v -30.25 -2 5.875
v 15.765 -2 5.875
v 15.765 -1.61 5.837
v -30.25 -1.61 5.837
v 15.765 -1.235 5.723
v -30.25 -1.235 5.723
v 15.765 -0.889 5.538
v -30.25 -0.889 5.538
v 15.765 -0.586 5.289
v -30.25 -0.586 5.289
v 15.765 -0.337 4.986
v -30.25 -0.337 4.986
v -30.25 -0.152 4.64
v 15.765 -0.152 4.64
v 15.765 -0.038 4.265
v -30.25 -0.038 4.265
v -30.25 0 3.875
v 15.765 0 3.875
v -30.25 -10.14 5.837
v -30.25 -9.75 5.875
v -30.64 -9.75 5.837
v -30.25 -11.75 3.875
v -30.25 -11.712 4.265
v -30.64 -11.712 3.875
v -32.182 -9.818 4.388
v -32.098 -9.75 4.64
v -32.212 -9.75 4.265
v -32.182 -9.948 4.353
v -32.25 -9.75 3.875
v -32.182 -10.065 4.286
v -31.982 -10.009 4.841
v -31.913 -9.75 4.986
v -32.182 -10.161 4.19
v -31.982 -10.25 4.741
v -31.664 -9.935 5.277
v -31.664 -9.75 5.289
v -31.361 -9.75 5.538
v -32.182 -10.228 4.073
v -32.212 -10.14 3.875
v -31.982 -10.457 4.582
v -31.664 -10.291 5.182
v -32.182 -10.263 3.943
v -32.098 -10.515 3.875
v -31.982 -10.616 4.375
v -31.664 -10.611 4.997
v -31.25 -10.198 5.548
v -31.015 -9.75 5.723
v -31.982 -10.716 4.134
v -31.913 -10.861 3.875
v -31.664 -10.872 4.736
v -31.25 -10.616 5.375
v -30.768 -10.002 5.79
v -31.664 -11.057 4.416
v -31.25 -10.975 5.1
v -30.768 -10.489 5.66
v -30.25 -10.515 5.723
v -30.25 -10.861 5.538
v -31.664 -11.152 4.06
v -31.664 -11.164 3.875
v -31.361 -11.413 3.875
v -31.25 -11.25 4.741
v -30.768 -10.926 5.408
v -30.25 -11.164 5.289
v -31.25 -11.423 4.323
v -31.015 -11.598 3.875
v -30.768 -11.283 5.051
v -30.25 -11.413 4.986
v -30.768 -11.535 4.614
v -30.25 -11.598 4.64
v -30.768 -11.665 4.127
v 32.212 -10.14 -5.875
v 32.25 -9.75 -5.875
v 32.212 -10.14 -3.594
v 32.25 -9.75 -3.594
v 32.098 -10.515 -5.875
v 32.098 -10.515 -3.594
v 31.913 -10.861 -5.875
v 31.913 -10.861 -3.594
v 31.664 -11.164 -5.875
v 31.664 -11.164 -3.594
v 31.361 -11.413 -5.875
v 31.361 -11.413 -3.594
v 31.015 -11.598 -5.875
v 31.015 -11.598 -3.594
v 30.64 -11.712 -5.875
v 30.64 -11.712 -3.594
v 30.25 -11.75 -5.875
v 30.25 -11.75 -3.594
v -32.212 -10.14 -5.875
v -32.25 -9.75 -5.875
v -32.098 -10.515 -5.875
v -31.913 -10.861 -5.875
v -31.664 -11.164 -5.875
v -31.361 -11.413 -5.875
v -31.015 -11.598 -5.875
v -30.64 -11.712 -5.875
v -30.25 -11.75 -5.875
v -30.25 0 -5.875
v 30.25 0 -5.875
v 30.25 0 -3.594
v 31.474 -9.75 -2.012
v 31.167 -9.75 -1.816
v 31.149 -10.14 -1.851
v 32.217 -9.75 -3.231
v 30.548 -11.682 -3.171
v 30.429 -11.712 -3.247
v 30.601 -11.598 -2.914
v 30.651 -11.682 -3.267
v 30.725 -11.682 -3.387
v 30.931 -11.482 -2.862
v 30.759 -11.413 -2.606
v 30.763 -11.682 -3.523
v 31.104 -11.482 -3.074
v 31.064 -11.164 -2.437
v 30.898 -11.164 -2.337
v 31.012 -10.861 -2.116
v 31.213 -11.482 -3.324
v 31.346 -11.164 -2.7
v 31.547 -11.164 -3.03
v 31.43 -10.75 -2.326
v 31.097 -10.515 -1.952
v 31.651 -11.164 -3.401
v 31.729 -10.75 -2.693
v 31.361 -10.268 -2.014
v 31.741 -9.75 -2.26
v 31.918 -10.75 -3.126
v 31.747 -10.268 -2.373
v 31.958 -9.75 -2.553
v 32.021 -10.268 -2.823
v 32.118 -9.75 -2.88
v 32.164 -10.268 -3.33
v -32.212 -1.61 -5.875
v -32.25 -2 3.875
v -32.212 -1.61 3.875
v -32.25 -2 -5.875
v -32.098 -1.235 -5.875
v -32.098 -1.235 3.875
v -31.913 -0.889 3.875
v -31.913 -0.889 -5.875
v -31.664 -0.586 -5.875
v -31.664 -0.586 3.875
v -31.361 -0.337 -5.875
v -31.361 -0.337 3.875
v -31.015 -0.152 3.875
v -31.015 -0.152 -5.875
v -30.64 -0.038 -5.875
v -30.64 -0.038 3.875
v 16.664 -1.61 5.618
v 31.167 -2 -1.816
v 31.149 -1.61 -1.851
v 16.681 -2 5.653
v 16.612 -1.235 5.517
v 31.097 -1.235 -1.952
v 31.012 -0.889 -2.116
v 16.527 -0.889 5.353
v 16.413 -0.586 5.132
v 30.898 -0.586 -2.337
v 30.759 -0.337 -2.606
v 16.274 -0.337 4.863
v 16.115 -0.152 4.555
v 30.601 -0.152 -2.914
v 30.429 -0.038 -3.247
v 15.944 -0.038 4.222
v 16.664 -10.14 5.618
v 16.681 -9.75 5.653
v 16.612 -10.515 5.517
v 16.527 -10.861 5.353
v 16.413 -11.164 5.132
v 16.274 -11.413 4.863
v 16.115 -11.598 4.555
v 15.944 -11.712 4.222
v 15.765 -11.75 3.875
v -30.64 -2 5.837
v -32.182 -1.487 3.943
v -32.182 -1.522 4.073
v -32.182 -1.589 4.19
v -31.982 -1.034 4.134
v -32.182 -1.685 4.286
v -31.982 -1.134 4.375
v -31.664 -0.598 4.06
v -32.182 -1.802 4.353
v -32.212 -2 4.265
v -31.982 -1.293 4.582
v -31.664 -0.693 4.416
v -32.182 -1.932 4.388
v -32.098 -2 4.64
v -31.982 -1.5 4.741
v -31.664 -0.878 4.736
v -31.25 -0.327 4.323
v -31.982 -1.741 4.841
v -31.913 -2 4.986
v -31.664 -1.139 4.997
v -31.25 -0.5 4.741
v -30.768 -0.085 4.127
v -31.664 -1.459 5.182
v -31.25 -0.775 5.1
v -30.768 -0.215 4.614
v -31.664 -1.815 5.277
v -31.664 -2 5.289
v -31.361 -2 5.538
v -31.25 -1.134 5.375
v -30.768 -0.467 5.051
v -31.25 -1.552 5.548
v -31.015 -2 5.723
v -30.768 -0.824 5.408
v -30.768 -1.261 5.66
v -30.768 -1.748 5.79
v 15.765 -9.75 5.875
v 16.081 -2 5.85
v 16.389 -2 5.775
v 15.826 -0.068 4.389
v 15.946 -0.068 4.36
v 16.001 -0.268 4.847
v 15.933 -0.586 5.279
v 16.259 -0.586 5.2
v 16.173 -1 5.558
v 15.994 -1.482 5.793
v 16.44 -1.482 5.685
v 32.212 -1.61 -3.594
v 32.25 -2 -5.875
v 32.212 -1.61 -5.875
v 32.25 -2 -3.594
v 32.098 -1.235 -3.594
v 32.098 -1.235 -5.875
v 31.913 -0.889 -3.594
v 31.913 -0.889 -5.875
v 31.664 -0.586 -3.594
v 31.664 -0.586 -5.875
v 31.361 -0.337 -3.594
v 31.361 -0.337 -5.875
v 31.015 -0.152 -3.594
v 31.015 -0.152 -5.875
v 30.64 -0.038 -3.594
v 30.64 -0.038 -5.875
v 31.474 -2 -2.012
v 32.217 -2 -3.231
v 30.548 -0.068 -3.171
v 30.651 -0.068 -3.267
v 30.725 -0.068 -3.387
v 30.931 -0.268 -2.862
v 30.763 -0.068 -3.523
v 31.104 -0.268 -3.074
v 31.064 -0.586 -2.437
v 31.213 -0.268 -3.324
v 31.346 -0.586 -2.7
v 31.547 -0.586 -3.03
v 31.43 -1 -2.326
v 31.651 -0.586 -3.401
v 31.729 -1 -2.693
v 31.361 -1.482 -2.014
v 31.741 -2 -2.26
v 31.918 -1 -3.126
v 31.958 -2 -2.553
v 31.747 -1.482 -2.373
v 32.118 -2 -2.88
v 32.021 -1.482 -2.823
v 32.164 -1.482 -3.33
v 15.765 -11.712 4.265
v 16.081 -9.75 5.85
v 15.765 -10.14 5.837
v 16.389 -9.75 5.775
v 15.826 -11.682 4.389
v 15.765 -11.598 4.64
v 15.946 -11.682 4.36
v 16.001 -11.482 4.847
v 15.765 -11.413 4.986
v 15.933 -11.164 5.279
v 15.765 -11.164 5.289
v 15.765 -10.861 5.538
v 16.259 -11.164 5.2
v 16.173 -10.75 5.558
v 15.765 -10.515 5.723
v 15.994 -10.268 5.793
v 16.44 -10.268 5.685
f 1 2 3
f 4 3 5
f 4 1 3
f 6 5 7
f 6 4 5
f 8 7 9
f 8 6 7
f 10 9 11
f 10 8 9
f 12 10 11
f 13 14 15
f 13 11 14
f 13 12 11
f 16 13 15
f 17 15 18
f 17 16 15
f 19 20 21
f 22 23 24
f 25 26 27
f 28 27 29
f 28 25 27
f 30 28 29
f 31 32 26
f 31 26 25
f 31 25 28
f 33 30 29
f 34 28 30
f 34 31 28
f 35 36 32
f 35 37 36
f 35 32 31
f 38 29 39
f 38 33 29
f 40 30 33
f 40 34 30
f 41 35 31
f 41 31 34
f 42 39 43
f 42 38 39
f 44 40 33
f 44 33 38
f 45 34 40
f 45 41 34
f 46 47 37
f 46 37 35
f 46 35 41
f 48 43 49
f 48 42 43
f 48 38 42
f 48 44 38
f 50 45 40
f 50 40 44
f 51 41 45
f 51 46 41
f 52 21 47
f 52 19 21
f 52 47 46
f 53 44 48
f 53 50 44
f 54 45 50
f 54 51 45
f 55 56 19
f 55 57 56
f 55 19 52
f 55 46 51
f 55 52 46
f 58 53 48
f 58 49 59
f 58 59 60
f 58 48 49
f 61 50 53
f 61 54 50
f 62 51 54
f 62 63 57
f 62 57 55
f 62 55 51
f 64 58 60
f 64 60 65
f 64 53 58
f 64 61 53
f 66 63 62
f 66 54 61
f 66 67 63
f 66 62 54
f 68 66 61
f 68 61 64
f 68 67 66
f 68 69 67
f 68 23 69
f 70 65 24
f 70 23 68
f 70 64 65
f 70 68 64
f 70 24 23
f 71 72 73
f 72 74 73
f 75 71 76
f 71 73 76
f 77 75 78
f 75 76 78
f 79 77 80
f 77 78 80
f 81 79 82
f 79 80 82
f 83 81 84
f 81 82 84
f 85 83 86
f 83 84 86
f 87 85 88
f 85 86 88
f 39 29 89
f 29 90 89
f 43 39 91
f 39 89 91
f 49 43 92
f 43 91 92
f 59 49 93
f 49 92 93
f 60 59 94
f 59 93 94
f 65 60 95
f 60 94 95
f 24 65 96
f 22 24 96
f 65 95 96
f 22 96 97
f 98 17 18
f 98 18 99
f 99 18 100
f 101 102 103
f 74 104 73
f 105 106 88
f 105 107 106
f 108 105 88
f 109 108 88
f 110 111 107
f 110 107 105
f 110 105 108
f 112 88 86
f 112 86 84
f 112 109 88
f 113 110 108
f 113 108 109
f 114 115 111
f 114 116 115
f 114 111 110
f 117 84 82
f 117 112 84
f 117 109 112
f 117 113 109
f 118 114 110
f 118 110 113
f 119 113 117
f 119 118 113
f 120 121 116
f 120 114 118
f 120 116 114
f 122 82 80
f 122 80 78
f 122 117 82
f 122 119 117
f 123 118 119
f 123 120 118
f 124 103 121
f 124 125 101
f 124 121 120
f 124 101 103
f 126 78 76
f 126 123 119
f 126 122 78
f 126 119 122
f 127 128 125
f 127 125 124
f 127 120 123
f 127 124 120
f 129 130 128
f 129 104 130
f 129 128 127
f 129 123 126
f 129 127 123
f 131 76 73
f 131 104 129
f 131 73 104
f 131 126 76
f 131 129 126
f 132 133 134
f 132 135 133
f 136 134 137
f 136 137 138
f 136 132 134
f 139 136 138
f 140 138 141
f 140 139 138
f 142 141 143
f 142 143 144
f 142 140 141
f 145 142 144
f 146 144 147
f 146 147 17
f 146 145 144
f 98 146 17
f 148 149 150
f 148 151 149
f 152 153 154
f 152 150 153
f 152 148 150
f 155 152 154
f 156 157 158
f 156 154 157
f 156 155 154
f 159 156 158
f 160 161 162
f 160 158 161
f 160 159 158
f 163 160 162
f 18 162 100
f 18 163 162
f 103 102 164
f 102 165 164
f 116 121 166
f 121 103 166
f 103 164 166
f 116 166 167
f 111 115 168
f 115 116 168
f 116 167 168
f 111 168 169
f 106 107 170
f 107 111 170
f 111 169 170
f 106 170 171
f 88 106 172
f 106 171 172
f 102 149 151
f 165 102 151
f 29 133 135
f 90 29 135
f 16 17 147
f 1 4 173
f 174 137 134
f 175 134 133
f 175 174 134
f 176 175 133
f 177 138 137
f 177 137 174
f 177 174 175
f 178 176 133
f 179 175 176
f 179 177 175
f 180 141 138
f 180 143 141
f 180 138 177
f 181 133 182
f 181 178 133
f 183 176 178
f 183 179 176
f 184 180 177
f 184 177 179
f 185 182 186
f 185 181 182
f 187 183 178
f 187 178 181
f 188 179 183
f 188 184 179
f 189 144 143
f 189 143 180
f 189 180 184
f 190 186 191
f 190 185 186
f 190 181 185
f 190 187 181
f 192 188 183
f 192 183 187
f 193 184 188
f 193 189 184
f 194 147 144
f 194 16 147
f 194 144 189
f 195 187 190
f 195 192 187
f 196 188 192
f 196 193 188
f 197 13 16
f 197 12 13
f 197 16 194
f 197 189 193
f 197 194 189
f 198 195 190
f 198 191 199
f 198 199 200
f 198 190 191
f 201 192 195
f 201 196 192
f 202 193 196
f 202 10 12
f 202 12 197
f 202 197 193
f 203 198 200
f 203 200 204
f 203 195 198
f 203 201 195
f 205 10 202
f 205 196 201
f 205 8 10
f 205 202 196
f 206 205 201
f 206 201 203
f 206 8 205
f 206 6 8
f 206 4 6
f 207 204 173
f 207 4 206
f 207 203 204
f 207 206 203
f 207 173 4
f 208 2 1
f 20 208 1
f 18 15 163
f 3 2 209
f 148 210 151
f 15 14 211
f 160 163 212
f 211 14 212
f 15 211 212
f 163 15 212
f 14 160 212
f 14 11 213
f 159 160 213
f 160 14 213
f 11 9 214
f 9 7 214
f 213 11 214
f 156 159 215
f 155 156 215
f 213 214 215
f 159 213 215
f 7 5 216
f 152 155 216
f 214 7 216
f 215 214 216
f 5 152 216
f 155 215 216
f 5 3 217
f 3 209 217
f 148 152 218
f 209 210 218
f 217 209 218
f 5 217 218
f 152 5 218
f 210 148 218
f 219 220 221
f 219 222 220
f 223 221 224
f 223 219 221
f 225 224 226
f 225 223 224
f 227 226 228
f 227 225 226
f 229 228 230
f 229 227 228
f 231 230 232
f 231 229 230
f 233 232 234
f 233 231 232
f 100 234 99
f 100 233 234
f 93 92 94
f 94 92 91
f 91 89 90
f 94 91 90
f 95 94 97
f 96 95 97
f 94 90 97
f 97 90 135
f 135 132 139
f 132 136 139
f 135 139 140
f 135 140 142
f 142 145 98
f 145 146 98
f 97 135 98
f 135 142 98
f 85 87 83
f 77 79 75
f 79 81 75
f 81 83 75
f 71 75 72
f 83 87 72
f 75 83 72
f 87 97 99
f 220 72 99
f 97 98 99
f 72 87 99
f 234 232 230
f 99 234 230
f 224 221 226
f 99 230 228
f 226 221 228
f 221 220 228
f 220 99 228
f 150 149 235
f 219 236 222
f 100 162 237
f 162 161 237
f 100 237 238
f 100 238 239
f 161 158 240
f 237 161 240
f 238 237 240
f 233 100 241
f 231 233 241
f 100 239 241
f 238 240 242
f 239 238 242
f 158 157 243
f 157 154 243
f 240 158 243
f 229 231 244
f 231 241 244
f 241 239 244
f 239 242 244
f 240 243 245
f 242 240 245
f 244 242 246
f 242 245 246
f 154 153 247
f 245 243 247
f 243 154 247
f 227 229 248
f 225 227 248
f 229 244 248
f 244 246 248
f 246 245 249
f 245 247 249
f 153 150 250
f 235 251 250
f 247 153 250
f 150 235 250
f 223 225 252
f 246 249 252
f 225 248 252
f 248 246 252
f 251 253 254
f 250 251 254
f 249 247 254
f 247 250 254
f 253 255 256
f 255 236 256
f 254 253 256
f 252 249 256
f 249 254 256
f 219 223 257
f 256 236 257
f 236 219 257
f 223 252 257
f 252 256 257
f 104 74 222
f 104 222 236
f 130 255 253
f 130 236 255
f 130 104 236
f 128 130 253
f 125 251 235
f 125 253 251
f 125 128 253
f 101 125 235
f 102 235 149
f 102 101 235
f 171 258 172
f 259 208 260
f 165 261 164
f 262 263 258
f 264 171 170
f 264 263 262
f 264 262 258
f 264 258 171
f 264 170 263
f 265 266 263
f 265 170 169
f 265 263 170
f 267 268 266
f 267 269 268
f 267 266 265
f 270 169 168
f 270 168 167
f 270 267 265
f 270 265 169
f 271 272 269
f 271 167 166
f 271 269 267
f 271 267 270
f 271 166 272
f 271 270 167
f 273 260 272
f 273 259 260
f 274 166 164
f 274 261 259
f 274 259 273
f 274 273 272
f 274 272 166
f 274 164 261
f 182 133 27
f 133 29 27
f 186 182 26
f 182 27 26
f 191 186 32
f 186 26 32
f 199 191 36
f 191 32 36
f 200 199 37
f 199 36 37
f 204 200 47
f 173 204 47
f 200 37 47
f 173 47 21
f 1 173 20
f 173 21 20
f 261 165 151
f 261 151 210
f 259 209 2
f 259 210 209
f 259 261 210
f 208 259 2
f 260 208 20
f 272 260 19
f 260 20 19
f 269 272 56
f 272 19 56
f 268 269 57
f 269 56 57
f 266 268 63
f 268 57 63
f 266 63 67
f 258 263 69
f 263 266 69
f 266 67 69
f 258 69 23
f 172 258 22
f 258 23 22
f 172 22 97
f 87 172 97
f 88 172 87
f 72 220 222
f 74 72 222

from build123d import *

# Parameters (mm, degrees)
PAD_DEPTH = 11.75
FILLET_R  = 2


with BuildPart() as part:
    # Sketch (on XZ_Plane of Origin) → Pad (new body)
    with BuildSketch(Plane.XZ):
        Polygon((-32.25, 5.875), (-32.25, -5.875), (32.25, -5.875), (32.25, -2.375), (16.25, 5.875), align=None)
    extrude(amount=PAD_DEPTH)

    # Fillet
    fillet_edges = [part.edges().sort_by_distance(p)[0] for p in [
        (32.25, 0, -4.125),
        (32.25, -11.75, -4.125),
        (32.25, -5.875, -2.375),
        (24.25, -11.75, 1.75),
        (24.25, 0, 1.75),
        (16.25, -5.875, 5.875),
        (-8, -11.75, 5.875),
        (-8, 0, 5.875),
        (-32.25, 0, 0),
        (-32.25, -5.875, 5.875),
        (-32.25, -11.75, 0),
    ]]
    fillet(fillet_edges, radius=FILLET_R)


solid = part.part
